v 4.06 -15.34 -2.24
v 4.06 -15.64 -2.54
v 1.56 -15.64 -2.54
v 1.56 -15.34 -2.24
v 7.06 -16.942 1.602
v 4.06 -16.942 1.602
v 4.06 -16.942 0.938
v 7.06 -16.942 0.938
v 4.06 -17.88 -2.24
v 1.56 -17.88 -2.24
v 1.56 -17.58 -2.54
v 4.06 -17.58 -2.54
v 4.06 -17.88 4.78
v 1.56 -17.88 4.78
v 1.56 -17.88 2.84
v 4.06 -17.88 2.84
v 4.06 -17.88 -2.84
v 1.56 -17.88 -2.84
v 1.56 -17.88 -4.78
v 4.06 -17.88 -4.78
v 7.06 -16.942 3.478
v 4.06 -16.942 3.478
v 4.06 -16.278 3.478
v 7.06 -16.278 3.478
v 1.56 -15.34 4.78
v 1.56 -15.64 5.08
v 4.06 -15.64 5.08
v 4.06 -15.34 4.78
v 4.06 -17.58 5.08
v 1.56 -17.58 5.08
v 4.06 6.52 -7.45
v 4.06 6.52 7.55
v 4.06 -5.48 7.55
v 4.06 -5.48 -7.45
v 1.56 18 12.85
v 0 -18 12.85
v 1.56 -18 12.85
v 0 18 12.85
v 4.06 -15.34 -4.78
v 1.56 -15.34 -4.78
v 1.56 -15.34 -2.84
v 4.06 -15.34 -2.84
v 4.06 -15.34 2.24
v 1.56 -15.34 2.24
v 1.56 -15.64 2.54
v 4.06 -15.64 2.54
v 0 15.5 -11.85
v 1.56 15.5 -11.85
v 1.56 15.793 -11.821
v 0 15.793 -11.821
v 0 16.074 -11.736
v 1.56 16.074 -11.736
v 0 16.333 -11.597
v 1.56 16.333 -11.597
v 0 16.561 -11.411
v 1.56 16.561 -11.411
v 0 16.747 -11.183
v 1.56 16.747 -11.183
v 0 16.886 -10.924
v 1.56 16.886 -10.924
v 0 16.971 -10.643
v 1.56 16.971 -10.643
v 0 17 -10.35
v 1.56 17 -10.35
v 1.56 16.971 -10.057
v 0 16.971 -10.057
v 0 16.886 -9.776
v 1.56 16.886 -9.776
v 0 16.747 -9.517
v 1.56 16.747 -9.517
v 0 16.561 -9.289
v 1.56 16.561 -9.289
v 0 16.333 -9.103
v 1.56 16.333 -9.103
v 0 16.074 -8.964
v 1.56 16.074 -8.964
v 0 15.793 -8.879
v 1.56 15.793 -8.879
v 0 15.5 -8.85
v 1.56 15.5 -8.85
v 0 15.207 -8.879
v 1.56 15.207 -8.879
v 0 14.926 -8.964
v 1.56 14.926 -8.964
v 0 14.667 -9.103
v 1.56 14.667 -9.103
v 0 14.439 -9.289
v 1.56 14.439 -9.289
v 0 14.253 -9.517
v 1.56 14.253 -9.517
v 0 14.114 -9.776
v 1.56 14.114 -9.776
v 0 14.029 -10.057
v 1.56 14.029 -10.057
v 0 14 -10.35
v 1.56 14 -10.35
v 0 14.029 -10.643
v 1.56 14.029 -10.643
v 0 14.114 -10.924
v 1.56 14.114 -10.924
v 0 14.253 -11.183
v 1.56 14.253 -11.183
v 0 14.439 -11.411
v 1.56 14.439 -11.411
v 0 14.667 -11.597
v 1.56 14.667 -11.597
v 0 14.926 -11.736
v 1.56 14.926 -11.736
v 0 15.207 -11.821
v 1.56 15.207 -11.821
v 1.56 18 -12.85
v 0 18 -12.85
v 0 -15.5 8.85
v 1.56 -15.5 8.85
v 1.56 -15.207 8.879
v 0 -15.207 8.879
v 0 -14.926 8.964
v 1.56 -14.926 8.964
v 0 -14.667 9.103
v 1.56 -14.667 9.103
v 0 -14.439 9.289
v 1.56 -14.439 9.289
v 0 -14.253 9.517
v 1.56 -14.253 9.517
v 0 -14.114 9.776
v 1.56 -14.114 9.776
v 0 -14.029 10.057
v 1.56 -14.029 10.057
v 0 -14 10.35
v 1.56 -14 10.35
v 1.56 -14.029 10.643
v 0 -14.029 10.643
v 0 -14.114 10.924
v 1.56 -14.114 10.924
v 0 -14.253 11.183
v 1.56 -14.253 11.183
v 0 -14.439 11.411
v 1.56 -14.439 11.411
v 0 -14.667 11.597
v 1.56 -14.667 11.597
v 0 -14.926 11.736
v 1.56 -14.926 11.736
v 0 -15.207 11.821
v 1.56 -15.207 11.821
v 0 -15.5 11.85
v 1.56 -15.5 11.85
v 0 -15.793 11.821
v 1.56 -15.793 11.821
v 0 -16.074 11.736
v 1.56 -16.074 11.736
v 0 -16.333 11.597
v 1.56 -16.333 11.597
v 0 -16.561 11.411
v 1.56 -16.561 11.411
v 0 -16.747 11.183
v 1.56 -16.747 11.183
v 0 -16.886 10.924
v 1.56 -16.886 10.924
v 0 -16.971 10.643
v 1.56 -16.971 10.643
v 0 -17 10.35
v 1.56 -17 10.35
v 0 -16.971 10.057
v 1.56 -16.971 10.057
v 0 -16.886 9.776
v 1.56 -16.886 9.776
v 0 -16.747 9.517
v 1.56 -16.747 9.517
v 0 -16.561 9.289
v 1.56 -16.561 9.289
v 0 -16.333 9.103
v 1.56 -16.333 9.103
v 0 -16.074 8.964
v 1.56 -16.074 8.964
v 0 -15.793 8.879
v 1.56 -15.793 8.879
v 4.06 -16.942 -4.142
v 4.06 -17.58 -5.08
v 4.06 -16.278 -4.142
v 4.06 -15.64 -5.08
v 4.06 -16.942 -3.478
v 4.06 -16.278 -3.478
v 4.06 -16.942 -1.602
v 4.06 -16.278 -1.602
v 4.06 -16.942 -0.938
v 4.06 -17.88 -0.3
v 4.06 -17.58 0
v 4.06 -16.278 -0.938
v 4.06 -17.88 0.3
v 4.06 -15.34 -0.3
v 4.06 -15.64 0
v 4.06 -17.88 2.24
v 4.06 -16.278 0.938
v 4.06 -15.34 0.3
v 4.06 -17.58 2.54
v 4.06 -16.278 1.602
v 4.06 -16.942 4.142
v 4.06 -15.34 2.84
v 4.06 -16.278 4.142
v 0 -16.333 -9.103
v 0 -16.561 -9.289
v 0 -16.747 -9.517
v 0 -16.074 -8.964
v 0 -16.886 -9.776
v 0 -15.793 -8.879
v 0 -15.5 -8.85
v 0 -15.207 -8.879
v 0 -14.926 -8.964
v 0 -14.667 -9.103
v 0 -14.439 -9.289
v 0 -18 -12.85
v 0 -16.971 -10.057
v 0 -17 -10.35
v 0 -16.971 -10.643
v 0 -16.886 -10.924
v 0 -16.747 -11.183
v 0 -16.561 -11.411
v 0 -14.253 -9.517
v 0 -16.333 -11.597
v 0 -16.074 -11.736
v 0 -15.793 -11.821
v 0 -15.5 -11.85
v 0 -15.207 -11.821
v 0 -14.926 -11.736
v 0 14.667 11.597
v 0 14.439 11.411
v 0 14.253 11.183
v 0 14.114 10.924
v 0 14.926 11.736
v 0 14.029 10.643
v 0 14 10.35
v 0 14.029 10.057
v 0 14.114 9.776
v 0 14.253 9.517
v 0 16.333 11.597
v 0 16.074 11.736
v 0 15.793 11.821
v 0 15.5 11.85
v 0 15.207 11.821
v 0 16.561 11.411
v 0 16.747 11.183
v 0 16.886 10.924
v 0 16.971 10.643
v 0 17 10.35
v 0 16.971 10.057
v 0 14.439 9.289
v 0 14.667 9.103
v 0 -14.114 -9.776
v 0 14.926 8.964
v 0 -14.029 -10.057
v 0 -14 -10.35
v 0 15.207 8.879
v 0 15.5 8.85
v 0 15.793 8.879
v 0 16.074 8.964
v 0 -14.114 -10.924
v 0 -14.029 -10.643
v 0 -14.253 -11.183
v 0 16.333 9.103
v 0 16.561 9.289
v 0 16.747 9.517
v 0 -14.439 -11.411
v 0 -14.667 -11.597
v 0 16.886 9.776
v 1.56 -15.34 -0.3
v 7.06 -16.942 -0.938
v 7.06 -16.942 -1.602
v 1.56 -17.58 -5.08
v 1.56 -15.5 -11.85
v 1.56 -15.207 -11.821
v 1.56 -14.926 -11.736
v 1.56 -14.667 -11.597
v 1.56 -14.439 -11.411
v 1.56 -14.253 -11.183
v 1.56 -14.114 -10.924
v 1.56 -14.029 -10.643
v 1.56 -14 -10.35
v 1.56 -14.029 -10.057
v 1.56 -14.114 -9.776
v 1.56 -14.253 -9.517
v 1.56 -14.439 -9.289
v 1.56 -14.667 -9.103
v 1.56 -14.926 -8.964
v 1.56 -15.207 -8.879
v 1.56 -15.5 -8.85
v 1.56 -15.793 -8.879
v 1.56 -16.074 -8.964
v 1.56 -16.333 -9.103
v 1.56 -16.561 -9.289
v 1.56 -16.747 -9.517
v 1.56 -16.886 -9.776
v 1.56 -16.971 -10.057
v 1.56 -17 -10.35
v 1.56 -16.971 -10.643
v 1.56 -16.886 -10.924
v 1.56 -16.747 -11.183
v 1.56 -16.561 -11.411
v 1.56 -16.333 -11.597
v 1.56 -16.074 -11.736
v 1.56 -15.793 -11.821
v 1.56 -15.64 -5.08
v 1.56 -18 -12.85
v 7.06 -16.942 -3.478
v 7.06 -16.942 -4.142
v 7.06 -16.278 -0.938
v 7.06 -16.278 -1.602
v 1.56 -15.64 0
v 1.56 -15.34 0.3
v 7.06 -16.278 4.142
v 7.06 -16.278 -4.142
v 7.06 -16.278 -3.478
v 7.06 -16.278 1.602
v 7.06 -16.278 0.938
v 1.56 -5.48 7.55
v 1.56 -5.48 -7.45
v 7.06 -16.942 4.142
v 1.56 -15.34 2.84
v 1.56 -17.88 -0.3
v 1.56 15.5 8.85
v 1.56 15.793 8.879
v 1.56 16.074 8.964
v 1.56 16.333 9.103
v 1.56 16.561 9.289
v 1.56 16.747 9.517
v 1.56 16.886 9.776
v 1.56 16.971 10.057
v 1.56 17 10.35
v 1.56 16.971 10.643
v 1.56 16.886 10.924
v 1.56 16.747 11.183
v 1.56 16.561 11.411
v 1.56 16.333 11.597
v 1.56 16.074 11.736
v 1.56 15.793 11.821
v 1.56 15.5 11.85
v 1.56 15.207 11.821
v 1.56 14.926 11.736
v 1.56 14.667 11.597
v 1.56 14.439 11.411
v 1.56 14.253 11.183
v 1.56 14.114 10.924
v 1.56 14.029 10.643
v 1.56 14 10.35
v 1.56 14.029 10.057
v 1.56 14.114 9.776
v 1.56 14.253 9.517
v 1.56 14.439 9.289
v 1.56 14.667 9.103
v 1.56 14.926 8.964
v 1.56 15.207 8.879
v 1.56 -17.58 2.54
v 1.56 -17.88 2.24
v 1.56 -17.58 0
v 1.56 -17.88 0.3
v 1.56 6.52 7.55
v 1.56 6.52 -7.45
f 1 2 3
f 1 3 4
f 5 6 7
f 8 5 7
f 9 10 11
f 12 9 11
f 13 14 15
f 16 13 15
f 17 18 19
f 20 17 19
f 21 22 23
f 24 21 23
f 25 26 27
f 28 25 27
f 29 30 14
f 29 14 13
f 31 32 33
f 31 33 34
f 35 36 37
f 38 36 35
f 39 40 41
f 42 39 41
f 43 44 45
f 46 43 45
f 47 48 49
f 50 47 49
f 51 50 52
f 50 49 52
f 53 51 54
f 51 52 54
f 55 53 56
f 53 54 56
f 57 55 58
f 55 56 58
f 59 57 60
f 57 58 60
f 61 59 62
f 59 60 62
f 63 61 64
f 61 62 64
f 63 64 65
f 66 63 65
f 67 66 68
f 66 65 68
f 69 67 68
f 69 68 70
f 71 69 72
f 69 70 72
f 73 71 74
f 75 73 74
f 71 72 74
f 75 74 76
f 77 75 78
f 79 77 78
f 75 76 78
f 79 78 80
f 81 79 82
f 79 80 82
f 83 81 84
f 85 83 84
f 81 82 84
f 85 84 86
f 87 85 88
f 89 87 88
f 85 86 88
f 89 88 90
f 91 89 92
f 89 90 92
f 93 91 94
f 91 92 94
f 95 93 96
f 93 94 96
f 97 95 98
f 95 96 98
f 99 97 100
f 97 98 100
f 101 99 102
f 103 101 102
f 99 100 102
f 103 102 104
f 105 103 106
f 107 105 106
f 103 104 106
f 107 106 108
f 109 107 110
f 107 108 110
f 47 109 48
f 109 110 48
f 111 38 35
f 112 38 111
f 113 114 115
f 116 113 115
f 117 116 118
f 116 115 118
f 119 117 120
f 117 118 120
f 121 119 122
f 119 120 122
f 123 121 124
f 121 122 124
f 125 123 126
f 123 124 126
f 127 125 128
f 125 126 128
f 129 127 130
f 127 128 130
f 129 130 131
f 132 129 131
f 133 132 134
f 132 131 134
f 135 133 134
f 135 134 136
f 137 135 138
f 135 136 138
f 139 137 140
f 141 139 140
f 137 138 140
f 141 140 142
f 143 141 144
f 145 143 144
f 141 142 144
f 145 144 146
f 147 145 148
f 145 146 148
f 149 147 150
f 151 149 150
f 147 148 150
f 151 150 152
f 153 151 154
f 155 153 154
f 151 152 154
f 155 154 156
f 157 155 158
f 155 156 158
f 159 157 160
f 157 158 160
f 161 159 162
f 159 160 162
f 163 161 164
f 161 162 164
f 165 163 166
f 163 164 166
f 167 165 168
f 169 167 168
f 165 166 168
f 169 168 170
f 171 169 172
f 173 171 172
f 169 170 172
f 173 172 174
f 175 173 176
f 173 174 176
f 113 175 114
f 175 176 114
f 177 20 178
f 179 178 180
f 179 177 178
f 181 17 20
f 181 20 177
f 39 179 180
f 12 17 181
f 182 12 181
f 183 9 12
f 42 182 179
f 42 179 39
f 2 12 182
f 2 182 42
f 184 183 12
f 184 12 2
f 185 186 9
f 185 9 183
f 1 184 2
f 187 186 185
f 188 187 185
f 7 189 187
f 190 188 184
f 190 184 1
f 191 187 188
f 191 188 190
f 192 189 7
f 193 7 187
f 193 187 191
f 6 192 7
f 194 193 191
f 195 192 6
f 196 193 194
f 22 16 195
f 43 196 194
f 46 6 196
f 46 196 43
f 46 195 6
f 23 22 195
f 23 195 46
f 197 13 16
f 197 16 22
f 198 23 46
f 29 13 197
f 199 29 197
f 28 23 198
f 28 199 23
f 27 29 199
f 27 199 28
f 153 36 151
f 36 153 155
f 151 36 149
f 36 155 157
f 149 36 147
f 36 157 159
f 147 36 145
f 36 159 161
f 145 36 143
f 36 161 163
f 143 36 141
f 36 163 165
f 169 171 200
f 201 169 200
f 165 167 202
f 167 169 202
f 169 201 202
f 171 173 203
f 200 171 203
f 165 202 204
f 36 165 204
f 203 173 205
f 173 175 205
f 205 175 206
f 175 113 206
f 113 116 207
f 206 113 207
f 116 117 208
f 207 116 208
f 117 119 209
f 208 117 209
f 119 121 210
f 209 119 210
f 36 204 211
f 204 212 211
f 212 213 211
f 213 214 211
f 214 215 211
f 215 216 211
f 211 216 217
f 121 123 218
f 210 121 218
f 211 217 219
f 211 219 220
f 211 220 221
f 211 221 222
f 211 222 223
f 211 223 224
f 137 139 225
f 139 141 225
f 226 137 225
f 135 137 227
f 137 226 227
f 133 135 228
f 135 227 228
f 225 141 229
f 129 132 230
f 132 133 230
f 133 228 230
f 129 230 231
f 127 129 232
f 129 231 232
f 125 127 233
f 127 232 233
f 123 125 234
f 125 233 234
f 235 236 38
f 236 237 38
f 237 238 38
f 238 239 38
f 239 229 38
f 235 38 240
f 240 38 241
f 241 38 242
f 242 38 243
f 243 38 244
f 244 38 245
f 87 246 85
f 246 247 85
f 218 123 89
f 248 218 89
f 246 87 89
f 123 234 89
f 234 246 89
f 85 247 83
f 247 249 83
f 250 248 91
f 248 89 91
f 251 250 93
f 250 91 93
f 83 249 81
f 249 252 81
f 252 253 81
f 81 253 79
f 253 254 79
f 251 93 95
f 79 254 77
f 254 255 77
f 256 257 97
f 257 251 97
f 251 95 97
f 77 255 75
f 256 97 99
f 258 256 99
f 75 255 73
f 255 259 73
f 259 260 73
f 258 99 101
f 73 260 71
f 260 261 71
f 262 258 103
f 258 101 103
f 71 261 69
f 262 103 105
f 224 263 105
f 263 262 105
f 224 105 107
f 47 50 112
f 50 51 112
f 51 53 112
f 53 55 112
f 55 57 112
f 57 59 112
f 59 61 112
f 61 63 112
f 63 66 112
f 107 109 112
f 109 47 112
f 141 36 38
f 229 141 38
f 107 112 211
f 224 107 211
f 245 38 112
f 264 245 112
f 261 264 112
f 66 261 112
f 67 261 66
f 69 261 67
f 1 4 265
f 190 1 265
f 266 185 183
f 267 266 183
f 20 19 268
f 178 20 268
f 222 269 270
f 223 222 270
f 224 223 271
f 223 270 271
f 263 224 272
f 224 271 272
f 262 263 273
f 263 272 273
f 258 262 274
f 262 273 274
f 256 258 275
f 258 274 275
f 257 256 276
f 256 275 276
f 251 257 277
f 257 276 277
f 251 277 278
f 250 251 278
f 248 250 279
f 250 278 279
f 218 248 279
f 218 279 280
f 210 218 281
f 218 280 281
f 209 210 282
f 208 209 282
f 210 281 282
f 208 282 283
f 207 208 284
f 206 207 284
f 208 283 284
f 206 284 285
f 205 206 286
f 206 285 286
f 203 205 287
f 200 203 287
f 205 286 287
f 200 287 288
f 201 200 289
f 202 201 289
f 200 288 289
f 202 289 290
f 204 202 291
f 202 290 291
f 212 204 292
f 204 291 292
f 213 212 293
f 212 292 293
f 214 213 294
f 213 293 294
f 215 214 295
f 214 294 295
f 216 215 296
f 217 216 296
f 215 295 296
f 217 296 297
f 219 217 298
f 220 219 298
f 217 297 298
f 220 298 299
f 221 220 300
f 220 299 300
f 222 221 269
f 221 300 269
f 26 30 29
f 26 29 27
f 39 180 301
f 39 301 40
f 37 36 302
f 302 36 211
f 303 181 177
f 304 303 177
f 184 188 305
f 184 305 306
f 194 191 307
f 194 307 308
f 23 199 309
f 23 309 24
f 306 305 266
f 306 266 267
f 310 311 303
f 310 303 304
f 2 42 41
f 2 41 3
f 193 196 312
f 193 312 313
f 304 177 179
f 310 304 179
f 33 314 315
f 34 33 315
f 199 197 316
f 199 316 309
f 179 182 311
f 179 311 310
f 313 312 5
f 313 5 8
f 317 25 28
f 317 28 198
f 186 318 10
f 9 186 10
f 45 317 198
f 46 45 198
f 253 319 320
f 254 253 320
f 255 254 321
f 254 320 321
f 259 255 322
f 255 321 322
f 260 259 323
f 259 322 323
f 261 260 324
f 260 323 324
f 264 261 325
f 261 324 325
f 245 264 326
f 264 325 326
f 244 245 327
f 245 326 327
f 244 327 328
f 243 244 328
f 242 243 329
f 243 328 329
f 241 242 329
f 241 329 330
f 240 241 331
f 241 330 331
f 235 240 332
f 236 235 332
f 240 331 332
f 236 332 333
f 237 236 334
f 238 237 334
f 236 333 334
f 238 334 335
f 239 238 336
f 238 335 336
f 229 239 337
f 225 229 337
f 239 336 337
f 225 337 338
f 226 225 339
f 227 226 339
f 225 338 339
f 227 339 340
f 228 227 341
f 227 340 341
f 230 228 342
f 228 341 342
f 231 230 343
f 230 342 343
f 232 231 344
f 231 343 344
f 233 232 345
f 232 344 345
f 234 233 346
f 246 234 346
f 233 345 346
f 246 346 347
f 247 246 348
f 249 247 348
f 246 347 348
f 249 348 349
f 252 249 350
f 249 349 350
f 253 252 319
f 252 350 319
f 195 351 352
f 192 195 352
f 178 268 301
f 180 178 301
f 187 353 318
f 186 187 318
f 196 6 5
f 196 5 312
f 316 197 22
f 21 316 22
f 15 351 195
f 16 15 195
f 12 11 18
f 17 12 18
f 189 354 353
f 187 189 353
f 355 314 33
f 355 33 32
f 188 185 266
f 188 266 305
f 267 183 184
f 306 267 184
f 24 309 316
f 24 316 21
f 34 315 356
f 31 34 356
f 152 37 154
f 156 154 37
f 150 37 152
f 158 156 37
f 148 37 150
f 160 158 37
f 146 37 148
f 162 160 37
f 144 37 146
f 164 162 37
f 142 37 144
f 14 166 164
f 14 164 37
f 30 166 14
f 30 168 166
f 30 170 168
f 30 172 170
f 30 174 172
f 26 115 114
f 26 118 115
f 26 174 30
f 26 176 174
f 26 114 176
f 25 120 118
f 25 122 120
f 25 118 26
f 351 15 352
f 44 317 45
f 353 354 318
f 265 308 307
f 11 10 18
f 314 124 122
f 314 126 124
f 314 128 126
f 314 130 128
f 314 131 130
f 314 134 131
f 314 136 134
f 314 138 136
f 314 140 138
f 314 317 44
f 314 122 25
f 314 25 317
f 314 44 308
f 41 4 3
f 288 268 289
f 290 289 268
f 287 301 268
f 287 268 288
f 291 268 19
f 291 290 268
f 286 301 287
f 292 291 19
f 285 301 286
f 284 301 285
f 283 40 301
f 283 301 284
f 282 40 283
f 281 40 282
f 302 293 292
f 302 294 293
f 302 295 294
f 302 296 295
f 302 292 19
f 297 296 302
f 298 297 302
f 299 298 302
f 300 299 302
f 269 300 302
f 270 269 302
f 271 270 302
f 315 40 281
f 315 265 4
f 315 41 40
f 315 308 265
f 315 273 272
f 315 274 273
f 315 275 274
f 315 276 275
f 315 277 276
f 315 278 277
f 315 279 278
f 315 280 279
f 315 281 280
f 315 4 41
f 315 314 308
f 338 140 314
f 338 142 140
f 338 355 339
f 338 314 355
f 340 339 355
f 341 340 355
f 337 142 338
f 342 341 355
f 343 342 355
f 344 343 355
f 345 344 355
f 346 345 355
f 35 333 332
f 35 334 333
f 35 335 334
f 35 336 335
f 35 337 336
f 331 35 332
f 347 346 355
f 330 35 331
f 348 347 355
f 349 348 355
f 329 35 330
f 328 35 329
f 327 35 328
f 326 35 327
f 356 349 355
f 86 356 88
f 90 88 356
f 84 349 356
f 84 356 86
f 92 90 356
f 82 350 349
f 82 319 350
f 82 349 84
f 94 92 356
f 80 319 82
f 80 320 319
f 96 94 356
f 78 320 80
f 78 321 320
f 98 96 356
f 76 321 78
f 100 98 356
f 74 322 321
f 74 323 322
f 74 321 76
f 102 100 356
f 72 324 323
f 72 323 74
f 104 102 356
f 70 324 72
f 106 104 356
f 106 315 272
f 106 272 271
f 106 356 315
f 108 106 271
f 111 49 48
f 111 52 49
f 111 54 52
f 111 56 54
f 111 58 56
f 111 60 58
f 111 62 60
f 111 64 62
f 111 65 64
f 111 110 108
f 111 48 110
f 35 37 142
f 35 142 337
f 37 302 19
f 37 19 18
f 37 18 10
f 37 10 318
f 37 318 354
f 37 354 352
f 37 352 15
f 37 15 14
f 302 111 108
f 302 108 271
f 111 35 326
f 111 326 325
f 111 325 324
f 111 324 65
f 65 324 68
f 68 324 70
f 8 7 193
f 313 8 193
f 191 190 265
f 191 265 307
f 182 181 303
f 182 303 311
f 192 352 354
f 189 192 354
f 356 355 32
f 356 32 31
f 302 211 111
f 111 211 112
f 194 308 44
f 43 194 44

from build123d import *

# Parameters (mm, degrees)
SKETCH_1_W             = 25.7
SKETCH_1_H             = 36
EXTRUDE_1_DEPTH        = 1.56
SKETCH_2_R             = 1.5
CUT_EXTRUDE_1_DEPTH    = 1.56
SKETCH_3_W             = 2.54
SKETCH_3_H             = 2.54
EXTRUDE_2_DEPTH        = 2.5
CHAMFER_1_SIZE         = 0.3
PATTERN_START          = 1.56
PATTERN_LINEAR_1_DEPTH = 2.5
SKETCH_4_W             = 15
SKETCH_4_H             = 12
EXTRUDE_3_DEPTH        = 2.5
SKETCH_5_W             = 0.664657546
SKETCH_5_H             = 0.664657545
EXTRUDE_4_DEPTH        = 3
PATTERN_LINEAR_2_COUNT = 4
PATTERN_LINEAR_2_PITCH = 2.54


# Read off the part's stored shape, not the designer's step: 阵列(线性)1
with BuildPart() as part:
    # 草图1 → 凸台-拉伸1 (new body)
    with BuildSketch(Plane(origin=(0, 0, 0), x_dir=(0, 0, -1), z_dir=(1, 0, 0))):
        Rectangle(SKETCH_1_W, SKETCH_1_H)
    extrude(amount=EXTRUDE_1_DEPTH)

    # 草图2 → 切除-拉伸1 (cut)
    with BuildSketch(Plane(origin=(1.56, 0, 0), x_dir=(0, 0, -1), z_dir=(1, 0, 0))):
        with Locations((-10.35, 15.5)):
            Circle(SKETCH_2_R)
        with Locations((10.35, 15.5)):
            Circle(SKETCH_2_R)
        with Locations((-10.35, -15.5)):
            Circle(SKETCH_2_R)
        with Locations((10.35, -15.5)):
            Circle(SKETCH_2_R)
    extrude(amount=-CUT_EXTRUDE_1_DEPTH, mode=Mode.SUBTRACT)

    # 草图3 → 凸台-拉伸2 (add)
    with BuildSketch(Plane(origin=(1.56, 0, 0), x_dir=(0, 0, -1), z_dir=(1, 0, 0))):
        with Locations((-3.81, -16.609886397)):
            Rectangle(SKETCH_3_W, SKETCH_3_H)
    extrude(amount=EXTRUDE_2_DEPTH)

    # 倒角1
    chamfer_1_edges = [part.edges().sort_by_distance(p)[0] for p in [
        (2.81, -17.879886397, 2.54),
        (2.81, -15.339886397, 2.54),
        (2.81, -15.339886397, 5.08),
        (2.81, -17.879886397, 5.08),
    ]]
    chamfer(chamfer_1_edges, length=CHAMFER_1_SIZE)

    # 阵列(线性)1 outline → 阵列(线性)1 (add)
    with BuildSketch(Plane.YZ.offset(PATTERN_START)):
        Polygon((-15.339886397, 0.3), (-15.339886397, 2.24), (-15.639886397, 2.54), (-17.579886397, 2.54), (-17.879886397, 2.24), (-17.879886397, 0.3), (-17.579886397, 0), (-17.879886397, -0.3), (-17.879886397, -2.24), (-17.579886397, -2.54), (-17.879886397, -2.84), (-17.879886397, -4.78), (-17.579886397, -5.08), (-15.639886397, -5.08), (-15.339886397, -4.78), (-15.339886397, -2.84), (-15.639886397, -2.54), (-15.339886397, -2.24), (-15.339886397, -0.3), (-15.639886397, 0), align=None)
    extrude(amount=PATTERN_LINEAR_1_DEPTH)

    # 草图4 → 凸台-拉伸3 (add)
    with BuildSketch(Plane(origin=(1.56, 0, 0), x_dir=(0, 0, -1), z_dir=(1, 0, 0))):
        with Locations((-0.05, 0.52)):
            Rectangle(SKETCH_4_W, SKETCH_4_H)
    extrude(amount=EXTRUDE_3_DEPTH)

    # 草图5 → 凸台-拉伸4 (add)
    with BuildSketch(Plane(origin=(4.06, 0, 0), x_dir=(0, 0, -1), z_dir=(1, 0, 0))):
        with Locations((-3.81, -16.609886397)):
            Rectangle(SKETCH_5_W, SKETCH_5_H)
    extrude_4 = extrude(amount=EXTRUDE_4_DEPTH)

    # 阵列(线性)2: 凸台-拉伸4 ×4
    with Locations(*[(0, 0, -i * PATTERN_LINEAR_2_PITCH) for i in range(1, PATTERN_LINEAR_2_COUNT)]):
        add(extrude_4)


solid = part.part
